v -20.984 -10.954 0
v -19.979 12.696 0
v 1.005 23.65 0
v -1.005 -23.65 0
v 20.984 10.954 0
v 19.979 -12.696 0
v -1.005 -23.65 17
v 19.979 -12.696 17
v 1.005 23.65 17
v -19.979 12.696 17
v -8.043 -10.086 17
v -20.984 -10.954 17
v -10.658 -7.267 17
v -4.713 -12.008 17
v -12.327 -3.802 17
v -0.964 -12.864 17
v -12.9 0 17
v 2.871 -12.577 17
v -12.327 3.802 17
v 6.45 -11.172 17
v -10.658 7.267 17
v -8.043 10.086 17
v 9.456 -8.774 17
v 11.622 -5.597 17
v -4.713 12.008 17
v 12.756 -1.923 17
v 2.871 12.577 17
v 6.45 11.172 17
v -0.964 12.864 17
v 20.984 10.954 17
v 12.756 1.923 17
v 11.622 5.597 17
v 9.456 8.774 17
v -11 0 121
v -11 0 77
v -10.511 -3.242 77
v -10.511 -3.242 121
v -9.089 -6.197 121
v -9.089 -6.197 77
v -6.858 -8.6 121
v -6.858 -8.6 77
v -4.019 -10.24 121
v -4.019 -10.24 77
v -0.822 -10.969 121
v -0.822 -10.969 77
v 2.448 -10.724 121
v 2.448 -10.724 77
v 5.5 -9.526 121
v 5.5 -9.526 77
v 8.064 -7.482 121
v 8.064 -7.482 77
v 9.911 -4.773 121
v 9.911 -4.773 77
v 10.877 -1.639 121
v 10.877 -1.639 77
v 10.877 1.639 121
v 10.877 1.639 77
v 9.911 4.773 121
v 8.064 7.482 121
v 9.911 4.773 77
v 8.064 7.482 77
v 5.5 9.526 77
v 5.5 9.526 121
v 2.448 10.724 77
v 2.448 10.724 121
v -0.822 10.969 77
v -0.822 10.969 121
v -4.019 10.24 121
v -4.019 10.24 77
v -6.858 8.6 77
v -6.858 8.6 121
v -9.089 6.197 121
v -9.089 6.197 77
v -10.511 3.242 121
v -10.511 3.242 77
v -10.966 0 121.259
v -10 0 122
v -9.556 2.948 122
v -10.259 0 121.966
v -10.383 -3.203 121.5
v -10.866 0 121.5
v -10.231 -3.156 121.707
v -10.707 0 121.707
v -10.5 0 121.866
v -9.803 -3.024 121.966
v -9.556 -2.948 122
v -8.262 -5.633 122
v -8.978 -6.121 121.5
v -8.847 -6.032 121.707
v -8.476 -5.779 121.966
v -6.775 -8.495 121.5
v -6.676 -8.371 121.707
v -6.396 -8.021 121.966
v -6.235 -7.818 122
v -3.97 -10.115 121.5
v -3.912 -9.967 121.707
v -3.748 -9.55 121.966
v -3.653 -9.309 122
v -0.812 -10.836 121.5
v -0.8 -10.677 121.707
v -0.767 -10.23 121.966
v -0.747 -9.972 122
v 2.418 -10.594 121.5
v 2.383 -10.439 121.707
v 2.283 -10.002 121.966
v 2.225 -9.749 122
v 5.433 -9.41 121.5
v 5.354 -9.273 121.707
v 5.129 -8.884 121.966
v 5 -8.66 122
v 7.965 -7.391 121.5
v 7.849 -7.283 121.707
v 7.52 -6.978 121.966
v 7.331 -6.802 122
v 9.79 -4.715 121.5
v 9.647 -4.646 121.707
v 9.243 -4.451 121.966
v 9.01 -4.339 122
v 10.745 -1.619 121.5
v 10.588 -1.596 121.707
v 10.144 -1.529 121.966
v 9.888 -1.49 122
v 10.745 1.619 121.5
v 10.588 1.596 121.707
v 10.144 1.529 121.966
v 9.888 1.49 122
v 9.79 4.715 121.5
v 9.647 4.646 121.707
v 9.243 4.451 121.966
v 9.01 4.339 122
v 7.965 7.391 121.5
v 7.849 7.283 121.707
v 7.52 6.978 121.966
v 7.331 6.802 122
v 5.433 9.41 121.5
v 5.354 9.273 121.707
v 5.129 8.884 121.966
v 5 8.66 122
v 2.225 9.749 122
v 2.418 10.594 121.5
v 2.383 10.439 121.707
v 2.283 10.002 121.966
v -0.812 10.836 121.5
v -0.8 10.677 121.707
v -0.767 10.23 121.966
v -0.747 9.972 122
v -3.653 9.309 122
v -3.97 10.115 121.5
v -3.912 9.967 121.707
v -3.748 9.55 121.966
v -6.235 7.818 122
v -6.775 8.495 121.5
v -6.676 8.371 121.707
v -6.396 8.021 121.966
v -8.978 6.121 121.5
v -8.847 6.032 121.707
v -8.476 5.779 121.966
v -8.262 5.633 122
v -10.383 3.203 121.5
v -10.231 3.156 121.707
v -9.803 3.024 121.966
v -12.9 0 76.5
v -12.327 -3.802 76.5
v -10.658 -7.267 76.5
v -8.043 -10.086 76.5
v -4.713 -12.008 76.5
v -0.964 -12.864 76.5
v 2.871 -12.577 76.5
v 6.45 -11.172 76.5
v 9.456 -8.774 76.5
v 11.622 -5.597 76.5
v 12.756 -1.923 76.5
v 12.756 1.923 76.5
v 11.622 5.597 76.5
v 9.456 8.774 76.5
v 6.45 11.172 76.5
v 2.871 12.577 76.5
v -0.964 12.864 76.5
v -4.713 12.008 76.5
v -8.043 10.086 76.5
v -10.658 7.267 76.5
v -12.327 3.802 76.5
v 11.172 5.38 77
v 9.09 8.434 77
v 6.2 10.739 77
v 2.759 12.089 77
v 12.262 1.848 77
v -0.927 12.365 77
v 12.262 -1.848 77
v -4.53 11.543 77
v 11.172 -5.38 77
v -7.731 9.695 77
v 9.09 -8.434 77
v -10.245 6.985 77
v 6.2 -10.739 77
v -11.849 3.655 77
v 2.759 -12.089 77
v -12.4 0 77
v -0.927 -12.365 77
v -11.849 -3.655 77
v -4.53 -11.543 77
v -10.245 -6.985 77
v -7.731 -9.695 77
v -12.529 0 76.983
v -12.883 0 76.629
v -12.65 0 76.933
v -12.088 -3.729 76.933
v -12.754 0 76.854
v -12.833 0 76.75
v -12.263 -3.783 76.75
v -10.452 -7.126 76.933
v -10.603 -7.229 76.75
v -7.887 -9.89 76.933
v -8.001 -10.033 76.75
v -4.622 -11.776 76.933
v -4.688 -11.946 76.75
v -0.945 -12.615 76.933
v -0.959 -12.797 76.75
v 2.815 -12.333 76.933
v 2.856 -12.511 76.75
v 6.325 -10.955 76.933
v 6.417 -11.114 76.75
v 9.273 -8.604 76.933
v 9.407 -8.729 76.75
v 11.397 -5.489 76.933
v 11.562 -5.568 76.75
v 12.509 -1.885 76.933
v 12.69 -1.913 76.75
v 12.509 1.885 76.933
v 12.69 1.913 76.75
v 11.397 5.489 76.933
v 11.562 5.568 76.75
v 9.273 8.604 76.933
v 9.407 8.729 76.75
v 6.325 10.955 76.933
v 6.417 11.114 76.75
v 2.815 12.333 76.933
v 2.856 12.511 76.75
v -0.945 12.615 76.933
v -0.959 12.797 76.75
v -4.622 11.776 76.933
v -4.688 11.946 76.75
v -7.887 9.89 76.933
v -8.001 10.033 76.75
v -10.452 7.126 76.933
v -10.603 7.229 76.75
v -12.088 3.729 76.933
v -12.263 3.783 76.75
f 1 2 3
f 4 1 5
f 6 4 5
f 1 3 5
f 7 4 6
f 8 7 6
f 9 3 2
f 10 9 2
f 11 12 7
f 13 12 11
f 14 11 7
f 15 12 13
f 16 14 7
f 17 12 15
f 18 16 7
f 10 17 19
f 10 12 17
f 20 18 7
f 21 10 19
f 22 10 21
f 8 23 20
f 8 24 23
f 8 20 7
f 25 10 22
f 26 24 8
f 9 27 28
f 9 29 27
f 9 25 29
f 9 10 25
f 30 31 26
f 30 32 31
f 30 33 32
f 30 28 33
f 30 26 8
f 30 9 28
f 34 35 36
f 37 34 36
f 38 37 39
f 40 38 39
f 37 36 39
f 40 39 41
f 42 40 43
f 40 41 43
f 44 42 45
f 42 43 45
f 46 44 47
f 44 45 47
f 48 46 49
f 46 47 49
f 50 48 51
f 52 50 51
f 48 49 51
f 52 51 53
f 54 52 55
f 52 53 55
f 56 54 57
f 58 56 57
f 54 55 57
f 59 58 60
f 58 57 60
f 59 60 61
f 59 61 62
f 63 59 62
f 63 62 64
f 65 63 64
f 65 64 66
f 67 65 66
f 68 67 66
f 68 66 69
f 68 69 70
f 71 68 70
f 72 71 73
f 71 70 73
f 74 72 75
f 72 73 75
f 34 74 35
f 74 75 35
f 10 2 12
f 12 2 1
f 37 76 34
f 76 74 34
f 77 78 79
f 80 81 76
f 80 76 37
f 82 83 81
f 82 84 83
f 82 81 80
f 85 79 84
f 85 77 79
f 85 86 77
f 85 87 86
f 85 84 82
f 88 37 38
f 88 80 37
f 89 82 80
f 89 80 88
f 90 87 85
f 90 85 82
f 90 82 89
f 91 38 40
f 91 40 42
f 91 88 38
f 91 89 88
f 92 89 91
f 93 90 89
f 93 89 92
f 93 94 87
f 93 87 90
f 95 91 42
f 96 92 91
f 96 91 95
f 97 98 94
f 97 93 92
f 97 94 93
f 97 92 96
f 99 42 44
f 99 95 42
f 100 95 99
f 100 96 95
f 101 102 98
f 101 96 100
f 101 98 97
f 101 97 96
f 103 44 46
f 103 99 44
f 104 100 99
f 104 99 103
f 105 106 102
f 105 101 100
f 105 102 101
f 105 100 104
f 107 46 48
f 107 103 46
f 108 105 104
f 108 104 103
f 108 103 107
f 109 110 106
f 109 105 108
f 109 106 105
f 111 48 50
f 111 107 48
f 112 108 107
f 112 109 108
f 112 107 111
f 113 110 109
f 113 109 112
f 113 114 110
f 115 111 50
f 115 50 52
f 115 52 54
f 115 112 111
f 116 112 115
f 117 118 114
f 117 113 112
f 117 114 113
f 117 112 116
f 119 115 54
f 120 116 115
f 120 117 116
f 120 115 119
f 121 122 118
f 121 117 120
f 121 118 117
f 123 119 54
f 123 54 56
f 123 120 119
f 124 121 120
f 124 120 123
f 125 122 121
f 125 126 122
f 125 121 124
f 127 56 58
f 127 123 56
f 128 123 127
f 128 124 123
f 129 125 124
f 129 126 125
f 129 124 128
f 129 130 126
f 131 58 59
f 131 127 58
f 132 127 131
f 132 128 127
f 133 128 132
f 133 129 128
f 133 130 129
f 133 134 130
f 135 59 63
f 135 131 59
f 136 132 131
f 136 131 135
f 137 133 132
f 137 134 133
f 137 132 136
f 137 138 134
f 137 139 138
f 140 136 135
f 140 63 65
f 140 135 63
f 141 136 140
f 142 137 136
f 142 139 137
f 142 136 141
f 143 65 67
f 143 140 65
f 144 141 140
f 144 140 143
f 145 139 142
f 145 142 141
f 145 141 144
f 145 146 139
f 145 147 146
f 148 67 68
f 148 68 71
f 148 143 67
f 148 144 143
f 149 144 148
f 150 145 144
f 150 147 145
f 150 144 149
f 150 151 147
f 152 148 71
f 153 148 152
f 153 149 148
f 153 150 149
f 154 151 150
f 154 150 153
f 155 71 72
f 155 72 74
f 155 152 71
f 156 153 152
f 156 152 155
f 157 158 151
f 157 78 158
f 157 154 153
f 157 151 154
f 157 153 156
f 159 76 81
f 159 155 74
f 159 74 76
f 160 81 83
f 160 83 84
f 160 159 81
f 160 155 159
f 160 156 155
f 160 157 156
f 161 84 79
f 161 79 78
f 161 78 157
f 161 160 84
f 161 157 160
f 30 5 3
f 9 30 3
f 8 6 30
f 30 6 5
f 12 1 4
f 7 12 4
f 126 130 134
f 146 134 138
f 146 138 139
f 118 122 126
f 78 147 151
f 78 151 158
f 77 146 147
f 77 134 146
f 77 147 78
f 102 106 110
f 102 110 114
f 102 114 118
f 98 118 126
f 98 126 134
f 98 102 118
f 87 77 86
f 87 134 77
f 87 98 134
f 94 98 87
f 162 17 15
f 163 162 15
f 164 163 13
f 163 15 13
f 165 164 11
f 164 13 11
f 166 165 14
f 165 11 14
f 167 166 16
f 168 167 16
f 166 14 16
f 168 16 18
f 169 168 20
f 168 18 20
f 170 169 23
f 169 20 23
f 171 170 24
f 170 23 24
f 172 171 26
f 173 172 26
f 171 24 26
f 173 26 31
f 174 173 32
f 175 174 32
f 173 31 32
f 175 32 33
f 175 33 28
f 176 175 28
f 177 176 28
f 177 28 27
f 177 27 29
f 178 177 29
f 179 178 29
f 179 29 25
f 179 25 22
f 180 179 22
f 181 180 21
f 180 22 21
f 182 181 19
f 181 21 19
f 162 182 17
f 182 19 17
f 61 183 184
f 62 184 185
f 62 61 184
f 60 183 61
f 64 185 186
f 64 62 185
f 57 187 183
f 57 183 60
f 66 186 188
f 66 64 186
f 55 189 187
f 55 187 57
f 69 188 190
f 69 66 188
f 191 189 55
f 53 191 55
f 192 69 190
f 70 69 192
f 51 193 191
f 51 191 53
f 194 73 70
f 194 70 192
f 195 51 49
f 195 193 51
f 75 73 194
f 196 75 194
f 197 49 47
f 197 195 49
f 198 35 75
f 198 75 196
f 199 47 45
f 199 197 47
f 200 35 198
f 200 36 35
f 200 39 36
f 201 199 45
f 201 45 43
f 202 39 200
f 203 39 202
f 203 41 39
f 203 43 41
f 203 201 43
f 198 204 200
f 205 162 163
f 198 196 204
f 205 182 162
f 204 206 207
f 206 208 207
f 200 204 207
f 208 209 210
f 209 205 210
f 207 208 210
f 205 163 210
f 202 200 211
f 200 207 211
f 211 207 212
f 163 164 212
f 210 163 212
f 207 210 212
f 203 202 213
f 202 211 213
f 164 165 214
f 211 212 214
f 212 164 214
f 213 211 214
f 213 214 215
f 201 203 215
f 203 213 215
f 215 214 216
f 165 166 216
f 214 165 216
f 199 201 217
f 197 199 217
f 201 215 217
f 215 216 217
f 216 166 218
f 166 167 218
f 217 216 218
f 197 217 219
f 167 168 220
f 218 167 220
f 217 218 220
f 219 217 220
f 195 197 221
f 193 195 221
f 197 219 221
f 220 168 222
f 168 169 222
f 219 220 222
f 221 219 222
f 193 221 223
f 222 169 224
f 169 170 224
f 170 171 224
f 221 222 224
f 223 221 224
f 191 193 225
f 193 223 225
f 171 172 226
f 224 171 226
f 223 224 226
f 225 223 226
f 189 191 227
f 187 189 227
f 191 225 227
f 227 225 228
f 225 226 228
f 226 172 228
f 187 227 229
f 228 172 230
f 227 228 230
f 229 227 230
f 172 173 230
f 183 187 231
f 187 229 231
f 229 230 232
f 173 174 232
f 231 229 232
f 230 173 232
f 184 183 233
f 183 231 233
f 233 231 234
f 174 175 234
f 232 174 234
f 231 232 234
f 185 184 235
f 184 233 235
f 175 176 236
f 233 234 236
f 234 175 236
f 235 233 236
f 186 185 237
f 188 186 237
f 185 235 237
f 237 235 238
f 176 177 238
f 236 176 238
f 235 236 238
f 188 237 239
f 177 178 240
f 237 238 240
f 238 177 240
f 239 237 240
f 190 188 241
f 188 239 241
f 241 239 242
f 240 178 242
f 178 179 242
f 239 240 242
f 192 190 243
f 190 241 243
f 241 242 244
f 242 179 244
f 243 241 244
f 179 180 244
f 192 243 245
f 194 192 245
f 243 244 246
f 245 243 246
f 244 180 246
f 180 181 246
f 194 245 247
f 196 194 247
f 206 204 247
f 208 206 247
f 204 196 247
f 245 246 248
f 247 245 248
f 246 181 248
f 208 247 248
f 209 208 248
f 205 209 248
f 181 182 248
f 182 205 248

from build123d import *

# Parameters (mm, degrees)
EXTRUDE_307_DEPTH = 17
SKETCH_2_R        = 12.9
EXTRUDE_1_DEPTH   = 60
SKETCH_3_R        = 11
EXTRUDE_2_DEPTH   = 45
FILLET_2_R        = 1
FILLET_4_R        = 0.5


with BuildPart() as part:
    # 草图1 → Extrude 307 (new body)
    with BuildSketch(Plane.XY):
        Polygon((20.984201837, 10.954296262), (1.005402075, 23.65), (-19.978799762, 12.695703738), (-20.984201837, -10.954296262), (-1.005402075, -23.65), (19.978799762, -12.695703738), align=None)
    extrude(amount=EXTRUDE_307_DEPTH)

    # 草图2 → 凸台-拉伸1 (add)
    with BuildSketch(Plane.XY.offset(17)):
        with Locations(Location((0, 0, 0), (0, 0, 180))):
            Circle(SKETCH_2_R)
    extrude(amount=EXTRUDE_1_DEPTH)

    # 草图3 → 凸台-拉伸2 (add)
    with BuildSketch(Plane.XY.offset(77)):
        with Locations(Location((0, 0, 0), (0, 0, 180))):
            Circle(SKETCH_3_R)
    extrude(amount=EXTRUDE_2_DEPTH)

    # 圆角2
    fillet_2_edges = [part.edges().sort_by_distance(p)[0] for p in [
        (11, 0, 122),
    ]]
    fillet(fillet_2_edges, radius=FILLET_2_R)

    # 圆角4
    fillet_4_edges = [part.edges().sort_by_distance(p)[0] for p in [
        (12.9, 0, 77),
    ]]
    fillet(fillet_4_edges, radius=FILLET_4_R)


solid = part.part
